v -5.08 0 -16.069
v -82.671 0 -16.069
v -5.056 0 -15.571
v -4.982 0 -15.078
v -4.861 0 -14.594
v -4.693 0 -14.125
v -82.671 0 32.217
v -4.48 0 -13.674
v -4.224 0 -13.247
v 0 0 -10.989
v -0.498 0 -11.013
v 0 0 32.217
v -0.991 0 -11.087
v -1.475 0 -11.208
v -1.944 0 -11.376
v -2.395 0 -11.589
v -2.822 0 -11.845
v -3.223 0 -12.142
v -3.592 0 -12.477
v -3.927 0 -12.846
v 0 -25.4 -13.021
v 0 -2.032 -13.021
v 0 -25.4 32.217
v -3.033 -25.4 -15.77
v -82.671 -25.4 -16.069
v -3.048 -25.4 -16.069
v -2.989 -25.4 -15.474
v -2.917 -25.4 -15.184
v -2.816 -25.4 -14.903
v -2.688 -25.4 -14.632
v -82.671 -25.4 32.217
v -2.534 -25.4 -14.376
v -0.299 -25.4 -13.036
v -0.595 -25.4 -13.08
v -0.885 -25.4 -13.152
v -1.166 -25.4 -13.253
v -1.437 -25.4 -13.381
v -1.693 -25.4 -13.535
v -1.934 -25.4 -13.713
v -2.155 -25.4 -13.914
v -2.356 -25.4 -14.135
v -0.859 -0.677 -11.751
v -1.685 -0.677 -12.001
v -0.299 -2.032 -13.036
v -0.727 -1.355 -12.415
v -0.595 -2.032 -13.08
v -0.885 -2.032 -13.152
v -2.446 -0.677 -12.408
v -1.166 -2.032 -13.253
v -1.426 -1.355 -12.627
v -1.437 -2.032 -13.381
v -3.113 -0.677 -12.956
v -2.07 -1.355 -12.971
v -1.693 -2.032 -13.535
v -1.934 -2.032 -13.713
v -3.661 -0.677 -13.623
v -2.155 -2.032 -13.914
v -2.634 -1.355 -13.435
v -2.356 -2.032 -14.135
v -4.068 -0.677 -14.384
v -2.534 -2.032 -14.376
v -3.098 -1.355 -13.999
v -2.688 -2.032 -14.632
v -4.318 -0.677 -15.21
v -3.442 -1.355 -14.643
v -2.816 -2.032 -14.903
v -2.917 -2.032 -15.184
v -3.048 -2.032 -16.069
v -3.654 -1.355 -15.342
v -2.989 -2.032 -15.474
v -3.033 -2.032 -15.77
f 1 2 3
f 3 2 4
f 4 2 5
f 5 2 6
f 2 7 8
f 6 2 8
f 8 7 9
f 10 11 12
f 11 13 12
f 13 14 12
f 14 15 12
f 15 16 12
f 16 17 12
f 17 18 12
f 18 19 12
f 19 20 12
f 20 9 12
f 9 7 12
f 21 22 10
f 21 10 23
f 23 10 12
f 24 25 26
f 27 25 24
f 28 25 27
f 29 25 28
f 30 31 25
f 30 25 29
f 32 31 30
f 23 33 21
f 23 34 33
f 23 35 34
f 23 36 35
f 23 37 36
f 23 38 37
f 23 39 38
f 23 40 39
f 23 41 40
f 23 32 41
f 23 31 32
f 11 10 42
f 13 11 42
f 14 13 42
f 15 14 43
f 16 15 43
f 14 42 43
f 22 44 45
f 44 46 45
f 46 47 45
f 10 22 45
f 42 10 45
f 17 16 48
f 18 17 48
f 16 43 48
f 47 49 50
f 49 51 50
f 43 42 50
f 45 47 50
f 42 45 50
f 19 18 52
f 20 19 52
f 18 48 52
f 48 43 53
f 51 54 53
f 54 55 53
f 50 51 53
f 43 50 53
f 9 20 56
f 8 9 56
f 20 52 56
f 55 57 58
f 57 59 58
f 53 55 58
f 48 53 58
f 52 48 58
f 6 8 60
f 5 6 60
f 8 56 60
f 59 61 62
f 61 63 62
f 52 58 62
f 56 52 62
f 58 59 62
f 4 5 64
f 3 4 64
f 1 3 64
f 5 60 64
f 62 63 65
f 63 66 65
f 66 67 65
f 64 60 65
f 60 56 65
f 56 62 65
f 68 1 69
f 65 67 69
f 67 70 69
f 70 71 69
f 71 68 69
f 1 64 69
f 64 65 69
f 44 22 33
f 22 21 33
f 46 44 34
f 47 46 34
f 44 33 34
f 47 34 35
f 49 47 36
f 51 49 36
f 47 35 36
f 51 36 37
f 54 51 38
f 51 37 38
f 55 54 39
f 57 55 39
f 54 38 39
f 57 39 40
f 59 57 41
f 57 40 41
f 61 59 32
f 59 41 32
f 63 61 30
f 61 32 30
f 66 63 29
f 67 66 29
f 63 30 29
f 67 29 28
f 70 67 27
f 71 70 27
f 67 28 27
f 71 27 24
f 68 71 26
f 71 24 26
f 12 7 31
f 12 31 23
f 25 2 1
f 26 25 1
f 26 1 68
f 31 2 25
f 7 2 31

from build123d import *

# Parameters (mm, degrees)
F1_W           = 82.6707333326
F1_H           = 48.286376521
F2_DEPTH       = 25.4
F3_D           = 6.096
F3_CSINK_D     = 10.16
F3_CSINK_ANGLE = 90


# Not quite as in the source:
# - a variable given as a bare number and used for a length is read in inches; the dataset says mm whatever the document's units were


with BuildPart() as f2:
    # F1 (on Front) → F2 (new body)
    with BuildSketch(Plane.XZ):
        with Locations((-41.3353666663, 8.0742510036)):
            Rectangle(F1_W, F1_H)
    extrude(amount=F2_DEPTH)

    # F3 (through all)
    with Locations(Plane(origin=(0, 0, 0), x_dir=(1, 0, 0), z_dir=(0, 1, 0))):
        with Locations((0, 16.0689372569)):
            CounterSinkHole(F3_D / 2, F3_CSINK_D / 2, counter_sink_angle=F3_CSINK_ANGLE)


solid = f2.part
